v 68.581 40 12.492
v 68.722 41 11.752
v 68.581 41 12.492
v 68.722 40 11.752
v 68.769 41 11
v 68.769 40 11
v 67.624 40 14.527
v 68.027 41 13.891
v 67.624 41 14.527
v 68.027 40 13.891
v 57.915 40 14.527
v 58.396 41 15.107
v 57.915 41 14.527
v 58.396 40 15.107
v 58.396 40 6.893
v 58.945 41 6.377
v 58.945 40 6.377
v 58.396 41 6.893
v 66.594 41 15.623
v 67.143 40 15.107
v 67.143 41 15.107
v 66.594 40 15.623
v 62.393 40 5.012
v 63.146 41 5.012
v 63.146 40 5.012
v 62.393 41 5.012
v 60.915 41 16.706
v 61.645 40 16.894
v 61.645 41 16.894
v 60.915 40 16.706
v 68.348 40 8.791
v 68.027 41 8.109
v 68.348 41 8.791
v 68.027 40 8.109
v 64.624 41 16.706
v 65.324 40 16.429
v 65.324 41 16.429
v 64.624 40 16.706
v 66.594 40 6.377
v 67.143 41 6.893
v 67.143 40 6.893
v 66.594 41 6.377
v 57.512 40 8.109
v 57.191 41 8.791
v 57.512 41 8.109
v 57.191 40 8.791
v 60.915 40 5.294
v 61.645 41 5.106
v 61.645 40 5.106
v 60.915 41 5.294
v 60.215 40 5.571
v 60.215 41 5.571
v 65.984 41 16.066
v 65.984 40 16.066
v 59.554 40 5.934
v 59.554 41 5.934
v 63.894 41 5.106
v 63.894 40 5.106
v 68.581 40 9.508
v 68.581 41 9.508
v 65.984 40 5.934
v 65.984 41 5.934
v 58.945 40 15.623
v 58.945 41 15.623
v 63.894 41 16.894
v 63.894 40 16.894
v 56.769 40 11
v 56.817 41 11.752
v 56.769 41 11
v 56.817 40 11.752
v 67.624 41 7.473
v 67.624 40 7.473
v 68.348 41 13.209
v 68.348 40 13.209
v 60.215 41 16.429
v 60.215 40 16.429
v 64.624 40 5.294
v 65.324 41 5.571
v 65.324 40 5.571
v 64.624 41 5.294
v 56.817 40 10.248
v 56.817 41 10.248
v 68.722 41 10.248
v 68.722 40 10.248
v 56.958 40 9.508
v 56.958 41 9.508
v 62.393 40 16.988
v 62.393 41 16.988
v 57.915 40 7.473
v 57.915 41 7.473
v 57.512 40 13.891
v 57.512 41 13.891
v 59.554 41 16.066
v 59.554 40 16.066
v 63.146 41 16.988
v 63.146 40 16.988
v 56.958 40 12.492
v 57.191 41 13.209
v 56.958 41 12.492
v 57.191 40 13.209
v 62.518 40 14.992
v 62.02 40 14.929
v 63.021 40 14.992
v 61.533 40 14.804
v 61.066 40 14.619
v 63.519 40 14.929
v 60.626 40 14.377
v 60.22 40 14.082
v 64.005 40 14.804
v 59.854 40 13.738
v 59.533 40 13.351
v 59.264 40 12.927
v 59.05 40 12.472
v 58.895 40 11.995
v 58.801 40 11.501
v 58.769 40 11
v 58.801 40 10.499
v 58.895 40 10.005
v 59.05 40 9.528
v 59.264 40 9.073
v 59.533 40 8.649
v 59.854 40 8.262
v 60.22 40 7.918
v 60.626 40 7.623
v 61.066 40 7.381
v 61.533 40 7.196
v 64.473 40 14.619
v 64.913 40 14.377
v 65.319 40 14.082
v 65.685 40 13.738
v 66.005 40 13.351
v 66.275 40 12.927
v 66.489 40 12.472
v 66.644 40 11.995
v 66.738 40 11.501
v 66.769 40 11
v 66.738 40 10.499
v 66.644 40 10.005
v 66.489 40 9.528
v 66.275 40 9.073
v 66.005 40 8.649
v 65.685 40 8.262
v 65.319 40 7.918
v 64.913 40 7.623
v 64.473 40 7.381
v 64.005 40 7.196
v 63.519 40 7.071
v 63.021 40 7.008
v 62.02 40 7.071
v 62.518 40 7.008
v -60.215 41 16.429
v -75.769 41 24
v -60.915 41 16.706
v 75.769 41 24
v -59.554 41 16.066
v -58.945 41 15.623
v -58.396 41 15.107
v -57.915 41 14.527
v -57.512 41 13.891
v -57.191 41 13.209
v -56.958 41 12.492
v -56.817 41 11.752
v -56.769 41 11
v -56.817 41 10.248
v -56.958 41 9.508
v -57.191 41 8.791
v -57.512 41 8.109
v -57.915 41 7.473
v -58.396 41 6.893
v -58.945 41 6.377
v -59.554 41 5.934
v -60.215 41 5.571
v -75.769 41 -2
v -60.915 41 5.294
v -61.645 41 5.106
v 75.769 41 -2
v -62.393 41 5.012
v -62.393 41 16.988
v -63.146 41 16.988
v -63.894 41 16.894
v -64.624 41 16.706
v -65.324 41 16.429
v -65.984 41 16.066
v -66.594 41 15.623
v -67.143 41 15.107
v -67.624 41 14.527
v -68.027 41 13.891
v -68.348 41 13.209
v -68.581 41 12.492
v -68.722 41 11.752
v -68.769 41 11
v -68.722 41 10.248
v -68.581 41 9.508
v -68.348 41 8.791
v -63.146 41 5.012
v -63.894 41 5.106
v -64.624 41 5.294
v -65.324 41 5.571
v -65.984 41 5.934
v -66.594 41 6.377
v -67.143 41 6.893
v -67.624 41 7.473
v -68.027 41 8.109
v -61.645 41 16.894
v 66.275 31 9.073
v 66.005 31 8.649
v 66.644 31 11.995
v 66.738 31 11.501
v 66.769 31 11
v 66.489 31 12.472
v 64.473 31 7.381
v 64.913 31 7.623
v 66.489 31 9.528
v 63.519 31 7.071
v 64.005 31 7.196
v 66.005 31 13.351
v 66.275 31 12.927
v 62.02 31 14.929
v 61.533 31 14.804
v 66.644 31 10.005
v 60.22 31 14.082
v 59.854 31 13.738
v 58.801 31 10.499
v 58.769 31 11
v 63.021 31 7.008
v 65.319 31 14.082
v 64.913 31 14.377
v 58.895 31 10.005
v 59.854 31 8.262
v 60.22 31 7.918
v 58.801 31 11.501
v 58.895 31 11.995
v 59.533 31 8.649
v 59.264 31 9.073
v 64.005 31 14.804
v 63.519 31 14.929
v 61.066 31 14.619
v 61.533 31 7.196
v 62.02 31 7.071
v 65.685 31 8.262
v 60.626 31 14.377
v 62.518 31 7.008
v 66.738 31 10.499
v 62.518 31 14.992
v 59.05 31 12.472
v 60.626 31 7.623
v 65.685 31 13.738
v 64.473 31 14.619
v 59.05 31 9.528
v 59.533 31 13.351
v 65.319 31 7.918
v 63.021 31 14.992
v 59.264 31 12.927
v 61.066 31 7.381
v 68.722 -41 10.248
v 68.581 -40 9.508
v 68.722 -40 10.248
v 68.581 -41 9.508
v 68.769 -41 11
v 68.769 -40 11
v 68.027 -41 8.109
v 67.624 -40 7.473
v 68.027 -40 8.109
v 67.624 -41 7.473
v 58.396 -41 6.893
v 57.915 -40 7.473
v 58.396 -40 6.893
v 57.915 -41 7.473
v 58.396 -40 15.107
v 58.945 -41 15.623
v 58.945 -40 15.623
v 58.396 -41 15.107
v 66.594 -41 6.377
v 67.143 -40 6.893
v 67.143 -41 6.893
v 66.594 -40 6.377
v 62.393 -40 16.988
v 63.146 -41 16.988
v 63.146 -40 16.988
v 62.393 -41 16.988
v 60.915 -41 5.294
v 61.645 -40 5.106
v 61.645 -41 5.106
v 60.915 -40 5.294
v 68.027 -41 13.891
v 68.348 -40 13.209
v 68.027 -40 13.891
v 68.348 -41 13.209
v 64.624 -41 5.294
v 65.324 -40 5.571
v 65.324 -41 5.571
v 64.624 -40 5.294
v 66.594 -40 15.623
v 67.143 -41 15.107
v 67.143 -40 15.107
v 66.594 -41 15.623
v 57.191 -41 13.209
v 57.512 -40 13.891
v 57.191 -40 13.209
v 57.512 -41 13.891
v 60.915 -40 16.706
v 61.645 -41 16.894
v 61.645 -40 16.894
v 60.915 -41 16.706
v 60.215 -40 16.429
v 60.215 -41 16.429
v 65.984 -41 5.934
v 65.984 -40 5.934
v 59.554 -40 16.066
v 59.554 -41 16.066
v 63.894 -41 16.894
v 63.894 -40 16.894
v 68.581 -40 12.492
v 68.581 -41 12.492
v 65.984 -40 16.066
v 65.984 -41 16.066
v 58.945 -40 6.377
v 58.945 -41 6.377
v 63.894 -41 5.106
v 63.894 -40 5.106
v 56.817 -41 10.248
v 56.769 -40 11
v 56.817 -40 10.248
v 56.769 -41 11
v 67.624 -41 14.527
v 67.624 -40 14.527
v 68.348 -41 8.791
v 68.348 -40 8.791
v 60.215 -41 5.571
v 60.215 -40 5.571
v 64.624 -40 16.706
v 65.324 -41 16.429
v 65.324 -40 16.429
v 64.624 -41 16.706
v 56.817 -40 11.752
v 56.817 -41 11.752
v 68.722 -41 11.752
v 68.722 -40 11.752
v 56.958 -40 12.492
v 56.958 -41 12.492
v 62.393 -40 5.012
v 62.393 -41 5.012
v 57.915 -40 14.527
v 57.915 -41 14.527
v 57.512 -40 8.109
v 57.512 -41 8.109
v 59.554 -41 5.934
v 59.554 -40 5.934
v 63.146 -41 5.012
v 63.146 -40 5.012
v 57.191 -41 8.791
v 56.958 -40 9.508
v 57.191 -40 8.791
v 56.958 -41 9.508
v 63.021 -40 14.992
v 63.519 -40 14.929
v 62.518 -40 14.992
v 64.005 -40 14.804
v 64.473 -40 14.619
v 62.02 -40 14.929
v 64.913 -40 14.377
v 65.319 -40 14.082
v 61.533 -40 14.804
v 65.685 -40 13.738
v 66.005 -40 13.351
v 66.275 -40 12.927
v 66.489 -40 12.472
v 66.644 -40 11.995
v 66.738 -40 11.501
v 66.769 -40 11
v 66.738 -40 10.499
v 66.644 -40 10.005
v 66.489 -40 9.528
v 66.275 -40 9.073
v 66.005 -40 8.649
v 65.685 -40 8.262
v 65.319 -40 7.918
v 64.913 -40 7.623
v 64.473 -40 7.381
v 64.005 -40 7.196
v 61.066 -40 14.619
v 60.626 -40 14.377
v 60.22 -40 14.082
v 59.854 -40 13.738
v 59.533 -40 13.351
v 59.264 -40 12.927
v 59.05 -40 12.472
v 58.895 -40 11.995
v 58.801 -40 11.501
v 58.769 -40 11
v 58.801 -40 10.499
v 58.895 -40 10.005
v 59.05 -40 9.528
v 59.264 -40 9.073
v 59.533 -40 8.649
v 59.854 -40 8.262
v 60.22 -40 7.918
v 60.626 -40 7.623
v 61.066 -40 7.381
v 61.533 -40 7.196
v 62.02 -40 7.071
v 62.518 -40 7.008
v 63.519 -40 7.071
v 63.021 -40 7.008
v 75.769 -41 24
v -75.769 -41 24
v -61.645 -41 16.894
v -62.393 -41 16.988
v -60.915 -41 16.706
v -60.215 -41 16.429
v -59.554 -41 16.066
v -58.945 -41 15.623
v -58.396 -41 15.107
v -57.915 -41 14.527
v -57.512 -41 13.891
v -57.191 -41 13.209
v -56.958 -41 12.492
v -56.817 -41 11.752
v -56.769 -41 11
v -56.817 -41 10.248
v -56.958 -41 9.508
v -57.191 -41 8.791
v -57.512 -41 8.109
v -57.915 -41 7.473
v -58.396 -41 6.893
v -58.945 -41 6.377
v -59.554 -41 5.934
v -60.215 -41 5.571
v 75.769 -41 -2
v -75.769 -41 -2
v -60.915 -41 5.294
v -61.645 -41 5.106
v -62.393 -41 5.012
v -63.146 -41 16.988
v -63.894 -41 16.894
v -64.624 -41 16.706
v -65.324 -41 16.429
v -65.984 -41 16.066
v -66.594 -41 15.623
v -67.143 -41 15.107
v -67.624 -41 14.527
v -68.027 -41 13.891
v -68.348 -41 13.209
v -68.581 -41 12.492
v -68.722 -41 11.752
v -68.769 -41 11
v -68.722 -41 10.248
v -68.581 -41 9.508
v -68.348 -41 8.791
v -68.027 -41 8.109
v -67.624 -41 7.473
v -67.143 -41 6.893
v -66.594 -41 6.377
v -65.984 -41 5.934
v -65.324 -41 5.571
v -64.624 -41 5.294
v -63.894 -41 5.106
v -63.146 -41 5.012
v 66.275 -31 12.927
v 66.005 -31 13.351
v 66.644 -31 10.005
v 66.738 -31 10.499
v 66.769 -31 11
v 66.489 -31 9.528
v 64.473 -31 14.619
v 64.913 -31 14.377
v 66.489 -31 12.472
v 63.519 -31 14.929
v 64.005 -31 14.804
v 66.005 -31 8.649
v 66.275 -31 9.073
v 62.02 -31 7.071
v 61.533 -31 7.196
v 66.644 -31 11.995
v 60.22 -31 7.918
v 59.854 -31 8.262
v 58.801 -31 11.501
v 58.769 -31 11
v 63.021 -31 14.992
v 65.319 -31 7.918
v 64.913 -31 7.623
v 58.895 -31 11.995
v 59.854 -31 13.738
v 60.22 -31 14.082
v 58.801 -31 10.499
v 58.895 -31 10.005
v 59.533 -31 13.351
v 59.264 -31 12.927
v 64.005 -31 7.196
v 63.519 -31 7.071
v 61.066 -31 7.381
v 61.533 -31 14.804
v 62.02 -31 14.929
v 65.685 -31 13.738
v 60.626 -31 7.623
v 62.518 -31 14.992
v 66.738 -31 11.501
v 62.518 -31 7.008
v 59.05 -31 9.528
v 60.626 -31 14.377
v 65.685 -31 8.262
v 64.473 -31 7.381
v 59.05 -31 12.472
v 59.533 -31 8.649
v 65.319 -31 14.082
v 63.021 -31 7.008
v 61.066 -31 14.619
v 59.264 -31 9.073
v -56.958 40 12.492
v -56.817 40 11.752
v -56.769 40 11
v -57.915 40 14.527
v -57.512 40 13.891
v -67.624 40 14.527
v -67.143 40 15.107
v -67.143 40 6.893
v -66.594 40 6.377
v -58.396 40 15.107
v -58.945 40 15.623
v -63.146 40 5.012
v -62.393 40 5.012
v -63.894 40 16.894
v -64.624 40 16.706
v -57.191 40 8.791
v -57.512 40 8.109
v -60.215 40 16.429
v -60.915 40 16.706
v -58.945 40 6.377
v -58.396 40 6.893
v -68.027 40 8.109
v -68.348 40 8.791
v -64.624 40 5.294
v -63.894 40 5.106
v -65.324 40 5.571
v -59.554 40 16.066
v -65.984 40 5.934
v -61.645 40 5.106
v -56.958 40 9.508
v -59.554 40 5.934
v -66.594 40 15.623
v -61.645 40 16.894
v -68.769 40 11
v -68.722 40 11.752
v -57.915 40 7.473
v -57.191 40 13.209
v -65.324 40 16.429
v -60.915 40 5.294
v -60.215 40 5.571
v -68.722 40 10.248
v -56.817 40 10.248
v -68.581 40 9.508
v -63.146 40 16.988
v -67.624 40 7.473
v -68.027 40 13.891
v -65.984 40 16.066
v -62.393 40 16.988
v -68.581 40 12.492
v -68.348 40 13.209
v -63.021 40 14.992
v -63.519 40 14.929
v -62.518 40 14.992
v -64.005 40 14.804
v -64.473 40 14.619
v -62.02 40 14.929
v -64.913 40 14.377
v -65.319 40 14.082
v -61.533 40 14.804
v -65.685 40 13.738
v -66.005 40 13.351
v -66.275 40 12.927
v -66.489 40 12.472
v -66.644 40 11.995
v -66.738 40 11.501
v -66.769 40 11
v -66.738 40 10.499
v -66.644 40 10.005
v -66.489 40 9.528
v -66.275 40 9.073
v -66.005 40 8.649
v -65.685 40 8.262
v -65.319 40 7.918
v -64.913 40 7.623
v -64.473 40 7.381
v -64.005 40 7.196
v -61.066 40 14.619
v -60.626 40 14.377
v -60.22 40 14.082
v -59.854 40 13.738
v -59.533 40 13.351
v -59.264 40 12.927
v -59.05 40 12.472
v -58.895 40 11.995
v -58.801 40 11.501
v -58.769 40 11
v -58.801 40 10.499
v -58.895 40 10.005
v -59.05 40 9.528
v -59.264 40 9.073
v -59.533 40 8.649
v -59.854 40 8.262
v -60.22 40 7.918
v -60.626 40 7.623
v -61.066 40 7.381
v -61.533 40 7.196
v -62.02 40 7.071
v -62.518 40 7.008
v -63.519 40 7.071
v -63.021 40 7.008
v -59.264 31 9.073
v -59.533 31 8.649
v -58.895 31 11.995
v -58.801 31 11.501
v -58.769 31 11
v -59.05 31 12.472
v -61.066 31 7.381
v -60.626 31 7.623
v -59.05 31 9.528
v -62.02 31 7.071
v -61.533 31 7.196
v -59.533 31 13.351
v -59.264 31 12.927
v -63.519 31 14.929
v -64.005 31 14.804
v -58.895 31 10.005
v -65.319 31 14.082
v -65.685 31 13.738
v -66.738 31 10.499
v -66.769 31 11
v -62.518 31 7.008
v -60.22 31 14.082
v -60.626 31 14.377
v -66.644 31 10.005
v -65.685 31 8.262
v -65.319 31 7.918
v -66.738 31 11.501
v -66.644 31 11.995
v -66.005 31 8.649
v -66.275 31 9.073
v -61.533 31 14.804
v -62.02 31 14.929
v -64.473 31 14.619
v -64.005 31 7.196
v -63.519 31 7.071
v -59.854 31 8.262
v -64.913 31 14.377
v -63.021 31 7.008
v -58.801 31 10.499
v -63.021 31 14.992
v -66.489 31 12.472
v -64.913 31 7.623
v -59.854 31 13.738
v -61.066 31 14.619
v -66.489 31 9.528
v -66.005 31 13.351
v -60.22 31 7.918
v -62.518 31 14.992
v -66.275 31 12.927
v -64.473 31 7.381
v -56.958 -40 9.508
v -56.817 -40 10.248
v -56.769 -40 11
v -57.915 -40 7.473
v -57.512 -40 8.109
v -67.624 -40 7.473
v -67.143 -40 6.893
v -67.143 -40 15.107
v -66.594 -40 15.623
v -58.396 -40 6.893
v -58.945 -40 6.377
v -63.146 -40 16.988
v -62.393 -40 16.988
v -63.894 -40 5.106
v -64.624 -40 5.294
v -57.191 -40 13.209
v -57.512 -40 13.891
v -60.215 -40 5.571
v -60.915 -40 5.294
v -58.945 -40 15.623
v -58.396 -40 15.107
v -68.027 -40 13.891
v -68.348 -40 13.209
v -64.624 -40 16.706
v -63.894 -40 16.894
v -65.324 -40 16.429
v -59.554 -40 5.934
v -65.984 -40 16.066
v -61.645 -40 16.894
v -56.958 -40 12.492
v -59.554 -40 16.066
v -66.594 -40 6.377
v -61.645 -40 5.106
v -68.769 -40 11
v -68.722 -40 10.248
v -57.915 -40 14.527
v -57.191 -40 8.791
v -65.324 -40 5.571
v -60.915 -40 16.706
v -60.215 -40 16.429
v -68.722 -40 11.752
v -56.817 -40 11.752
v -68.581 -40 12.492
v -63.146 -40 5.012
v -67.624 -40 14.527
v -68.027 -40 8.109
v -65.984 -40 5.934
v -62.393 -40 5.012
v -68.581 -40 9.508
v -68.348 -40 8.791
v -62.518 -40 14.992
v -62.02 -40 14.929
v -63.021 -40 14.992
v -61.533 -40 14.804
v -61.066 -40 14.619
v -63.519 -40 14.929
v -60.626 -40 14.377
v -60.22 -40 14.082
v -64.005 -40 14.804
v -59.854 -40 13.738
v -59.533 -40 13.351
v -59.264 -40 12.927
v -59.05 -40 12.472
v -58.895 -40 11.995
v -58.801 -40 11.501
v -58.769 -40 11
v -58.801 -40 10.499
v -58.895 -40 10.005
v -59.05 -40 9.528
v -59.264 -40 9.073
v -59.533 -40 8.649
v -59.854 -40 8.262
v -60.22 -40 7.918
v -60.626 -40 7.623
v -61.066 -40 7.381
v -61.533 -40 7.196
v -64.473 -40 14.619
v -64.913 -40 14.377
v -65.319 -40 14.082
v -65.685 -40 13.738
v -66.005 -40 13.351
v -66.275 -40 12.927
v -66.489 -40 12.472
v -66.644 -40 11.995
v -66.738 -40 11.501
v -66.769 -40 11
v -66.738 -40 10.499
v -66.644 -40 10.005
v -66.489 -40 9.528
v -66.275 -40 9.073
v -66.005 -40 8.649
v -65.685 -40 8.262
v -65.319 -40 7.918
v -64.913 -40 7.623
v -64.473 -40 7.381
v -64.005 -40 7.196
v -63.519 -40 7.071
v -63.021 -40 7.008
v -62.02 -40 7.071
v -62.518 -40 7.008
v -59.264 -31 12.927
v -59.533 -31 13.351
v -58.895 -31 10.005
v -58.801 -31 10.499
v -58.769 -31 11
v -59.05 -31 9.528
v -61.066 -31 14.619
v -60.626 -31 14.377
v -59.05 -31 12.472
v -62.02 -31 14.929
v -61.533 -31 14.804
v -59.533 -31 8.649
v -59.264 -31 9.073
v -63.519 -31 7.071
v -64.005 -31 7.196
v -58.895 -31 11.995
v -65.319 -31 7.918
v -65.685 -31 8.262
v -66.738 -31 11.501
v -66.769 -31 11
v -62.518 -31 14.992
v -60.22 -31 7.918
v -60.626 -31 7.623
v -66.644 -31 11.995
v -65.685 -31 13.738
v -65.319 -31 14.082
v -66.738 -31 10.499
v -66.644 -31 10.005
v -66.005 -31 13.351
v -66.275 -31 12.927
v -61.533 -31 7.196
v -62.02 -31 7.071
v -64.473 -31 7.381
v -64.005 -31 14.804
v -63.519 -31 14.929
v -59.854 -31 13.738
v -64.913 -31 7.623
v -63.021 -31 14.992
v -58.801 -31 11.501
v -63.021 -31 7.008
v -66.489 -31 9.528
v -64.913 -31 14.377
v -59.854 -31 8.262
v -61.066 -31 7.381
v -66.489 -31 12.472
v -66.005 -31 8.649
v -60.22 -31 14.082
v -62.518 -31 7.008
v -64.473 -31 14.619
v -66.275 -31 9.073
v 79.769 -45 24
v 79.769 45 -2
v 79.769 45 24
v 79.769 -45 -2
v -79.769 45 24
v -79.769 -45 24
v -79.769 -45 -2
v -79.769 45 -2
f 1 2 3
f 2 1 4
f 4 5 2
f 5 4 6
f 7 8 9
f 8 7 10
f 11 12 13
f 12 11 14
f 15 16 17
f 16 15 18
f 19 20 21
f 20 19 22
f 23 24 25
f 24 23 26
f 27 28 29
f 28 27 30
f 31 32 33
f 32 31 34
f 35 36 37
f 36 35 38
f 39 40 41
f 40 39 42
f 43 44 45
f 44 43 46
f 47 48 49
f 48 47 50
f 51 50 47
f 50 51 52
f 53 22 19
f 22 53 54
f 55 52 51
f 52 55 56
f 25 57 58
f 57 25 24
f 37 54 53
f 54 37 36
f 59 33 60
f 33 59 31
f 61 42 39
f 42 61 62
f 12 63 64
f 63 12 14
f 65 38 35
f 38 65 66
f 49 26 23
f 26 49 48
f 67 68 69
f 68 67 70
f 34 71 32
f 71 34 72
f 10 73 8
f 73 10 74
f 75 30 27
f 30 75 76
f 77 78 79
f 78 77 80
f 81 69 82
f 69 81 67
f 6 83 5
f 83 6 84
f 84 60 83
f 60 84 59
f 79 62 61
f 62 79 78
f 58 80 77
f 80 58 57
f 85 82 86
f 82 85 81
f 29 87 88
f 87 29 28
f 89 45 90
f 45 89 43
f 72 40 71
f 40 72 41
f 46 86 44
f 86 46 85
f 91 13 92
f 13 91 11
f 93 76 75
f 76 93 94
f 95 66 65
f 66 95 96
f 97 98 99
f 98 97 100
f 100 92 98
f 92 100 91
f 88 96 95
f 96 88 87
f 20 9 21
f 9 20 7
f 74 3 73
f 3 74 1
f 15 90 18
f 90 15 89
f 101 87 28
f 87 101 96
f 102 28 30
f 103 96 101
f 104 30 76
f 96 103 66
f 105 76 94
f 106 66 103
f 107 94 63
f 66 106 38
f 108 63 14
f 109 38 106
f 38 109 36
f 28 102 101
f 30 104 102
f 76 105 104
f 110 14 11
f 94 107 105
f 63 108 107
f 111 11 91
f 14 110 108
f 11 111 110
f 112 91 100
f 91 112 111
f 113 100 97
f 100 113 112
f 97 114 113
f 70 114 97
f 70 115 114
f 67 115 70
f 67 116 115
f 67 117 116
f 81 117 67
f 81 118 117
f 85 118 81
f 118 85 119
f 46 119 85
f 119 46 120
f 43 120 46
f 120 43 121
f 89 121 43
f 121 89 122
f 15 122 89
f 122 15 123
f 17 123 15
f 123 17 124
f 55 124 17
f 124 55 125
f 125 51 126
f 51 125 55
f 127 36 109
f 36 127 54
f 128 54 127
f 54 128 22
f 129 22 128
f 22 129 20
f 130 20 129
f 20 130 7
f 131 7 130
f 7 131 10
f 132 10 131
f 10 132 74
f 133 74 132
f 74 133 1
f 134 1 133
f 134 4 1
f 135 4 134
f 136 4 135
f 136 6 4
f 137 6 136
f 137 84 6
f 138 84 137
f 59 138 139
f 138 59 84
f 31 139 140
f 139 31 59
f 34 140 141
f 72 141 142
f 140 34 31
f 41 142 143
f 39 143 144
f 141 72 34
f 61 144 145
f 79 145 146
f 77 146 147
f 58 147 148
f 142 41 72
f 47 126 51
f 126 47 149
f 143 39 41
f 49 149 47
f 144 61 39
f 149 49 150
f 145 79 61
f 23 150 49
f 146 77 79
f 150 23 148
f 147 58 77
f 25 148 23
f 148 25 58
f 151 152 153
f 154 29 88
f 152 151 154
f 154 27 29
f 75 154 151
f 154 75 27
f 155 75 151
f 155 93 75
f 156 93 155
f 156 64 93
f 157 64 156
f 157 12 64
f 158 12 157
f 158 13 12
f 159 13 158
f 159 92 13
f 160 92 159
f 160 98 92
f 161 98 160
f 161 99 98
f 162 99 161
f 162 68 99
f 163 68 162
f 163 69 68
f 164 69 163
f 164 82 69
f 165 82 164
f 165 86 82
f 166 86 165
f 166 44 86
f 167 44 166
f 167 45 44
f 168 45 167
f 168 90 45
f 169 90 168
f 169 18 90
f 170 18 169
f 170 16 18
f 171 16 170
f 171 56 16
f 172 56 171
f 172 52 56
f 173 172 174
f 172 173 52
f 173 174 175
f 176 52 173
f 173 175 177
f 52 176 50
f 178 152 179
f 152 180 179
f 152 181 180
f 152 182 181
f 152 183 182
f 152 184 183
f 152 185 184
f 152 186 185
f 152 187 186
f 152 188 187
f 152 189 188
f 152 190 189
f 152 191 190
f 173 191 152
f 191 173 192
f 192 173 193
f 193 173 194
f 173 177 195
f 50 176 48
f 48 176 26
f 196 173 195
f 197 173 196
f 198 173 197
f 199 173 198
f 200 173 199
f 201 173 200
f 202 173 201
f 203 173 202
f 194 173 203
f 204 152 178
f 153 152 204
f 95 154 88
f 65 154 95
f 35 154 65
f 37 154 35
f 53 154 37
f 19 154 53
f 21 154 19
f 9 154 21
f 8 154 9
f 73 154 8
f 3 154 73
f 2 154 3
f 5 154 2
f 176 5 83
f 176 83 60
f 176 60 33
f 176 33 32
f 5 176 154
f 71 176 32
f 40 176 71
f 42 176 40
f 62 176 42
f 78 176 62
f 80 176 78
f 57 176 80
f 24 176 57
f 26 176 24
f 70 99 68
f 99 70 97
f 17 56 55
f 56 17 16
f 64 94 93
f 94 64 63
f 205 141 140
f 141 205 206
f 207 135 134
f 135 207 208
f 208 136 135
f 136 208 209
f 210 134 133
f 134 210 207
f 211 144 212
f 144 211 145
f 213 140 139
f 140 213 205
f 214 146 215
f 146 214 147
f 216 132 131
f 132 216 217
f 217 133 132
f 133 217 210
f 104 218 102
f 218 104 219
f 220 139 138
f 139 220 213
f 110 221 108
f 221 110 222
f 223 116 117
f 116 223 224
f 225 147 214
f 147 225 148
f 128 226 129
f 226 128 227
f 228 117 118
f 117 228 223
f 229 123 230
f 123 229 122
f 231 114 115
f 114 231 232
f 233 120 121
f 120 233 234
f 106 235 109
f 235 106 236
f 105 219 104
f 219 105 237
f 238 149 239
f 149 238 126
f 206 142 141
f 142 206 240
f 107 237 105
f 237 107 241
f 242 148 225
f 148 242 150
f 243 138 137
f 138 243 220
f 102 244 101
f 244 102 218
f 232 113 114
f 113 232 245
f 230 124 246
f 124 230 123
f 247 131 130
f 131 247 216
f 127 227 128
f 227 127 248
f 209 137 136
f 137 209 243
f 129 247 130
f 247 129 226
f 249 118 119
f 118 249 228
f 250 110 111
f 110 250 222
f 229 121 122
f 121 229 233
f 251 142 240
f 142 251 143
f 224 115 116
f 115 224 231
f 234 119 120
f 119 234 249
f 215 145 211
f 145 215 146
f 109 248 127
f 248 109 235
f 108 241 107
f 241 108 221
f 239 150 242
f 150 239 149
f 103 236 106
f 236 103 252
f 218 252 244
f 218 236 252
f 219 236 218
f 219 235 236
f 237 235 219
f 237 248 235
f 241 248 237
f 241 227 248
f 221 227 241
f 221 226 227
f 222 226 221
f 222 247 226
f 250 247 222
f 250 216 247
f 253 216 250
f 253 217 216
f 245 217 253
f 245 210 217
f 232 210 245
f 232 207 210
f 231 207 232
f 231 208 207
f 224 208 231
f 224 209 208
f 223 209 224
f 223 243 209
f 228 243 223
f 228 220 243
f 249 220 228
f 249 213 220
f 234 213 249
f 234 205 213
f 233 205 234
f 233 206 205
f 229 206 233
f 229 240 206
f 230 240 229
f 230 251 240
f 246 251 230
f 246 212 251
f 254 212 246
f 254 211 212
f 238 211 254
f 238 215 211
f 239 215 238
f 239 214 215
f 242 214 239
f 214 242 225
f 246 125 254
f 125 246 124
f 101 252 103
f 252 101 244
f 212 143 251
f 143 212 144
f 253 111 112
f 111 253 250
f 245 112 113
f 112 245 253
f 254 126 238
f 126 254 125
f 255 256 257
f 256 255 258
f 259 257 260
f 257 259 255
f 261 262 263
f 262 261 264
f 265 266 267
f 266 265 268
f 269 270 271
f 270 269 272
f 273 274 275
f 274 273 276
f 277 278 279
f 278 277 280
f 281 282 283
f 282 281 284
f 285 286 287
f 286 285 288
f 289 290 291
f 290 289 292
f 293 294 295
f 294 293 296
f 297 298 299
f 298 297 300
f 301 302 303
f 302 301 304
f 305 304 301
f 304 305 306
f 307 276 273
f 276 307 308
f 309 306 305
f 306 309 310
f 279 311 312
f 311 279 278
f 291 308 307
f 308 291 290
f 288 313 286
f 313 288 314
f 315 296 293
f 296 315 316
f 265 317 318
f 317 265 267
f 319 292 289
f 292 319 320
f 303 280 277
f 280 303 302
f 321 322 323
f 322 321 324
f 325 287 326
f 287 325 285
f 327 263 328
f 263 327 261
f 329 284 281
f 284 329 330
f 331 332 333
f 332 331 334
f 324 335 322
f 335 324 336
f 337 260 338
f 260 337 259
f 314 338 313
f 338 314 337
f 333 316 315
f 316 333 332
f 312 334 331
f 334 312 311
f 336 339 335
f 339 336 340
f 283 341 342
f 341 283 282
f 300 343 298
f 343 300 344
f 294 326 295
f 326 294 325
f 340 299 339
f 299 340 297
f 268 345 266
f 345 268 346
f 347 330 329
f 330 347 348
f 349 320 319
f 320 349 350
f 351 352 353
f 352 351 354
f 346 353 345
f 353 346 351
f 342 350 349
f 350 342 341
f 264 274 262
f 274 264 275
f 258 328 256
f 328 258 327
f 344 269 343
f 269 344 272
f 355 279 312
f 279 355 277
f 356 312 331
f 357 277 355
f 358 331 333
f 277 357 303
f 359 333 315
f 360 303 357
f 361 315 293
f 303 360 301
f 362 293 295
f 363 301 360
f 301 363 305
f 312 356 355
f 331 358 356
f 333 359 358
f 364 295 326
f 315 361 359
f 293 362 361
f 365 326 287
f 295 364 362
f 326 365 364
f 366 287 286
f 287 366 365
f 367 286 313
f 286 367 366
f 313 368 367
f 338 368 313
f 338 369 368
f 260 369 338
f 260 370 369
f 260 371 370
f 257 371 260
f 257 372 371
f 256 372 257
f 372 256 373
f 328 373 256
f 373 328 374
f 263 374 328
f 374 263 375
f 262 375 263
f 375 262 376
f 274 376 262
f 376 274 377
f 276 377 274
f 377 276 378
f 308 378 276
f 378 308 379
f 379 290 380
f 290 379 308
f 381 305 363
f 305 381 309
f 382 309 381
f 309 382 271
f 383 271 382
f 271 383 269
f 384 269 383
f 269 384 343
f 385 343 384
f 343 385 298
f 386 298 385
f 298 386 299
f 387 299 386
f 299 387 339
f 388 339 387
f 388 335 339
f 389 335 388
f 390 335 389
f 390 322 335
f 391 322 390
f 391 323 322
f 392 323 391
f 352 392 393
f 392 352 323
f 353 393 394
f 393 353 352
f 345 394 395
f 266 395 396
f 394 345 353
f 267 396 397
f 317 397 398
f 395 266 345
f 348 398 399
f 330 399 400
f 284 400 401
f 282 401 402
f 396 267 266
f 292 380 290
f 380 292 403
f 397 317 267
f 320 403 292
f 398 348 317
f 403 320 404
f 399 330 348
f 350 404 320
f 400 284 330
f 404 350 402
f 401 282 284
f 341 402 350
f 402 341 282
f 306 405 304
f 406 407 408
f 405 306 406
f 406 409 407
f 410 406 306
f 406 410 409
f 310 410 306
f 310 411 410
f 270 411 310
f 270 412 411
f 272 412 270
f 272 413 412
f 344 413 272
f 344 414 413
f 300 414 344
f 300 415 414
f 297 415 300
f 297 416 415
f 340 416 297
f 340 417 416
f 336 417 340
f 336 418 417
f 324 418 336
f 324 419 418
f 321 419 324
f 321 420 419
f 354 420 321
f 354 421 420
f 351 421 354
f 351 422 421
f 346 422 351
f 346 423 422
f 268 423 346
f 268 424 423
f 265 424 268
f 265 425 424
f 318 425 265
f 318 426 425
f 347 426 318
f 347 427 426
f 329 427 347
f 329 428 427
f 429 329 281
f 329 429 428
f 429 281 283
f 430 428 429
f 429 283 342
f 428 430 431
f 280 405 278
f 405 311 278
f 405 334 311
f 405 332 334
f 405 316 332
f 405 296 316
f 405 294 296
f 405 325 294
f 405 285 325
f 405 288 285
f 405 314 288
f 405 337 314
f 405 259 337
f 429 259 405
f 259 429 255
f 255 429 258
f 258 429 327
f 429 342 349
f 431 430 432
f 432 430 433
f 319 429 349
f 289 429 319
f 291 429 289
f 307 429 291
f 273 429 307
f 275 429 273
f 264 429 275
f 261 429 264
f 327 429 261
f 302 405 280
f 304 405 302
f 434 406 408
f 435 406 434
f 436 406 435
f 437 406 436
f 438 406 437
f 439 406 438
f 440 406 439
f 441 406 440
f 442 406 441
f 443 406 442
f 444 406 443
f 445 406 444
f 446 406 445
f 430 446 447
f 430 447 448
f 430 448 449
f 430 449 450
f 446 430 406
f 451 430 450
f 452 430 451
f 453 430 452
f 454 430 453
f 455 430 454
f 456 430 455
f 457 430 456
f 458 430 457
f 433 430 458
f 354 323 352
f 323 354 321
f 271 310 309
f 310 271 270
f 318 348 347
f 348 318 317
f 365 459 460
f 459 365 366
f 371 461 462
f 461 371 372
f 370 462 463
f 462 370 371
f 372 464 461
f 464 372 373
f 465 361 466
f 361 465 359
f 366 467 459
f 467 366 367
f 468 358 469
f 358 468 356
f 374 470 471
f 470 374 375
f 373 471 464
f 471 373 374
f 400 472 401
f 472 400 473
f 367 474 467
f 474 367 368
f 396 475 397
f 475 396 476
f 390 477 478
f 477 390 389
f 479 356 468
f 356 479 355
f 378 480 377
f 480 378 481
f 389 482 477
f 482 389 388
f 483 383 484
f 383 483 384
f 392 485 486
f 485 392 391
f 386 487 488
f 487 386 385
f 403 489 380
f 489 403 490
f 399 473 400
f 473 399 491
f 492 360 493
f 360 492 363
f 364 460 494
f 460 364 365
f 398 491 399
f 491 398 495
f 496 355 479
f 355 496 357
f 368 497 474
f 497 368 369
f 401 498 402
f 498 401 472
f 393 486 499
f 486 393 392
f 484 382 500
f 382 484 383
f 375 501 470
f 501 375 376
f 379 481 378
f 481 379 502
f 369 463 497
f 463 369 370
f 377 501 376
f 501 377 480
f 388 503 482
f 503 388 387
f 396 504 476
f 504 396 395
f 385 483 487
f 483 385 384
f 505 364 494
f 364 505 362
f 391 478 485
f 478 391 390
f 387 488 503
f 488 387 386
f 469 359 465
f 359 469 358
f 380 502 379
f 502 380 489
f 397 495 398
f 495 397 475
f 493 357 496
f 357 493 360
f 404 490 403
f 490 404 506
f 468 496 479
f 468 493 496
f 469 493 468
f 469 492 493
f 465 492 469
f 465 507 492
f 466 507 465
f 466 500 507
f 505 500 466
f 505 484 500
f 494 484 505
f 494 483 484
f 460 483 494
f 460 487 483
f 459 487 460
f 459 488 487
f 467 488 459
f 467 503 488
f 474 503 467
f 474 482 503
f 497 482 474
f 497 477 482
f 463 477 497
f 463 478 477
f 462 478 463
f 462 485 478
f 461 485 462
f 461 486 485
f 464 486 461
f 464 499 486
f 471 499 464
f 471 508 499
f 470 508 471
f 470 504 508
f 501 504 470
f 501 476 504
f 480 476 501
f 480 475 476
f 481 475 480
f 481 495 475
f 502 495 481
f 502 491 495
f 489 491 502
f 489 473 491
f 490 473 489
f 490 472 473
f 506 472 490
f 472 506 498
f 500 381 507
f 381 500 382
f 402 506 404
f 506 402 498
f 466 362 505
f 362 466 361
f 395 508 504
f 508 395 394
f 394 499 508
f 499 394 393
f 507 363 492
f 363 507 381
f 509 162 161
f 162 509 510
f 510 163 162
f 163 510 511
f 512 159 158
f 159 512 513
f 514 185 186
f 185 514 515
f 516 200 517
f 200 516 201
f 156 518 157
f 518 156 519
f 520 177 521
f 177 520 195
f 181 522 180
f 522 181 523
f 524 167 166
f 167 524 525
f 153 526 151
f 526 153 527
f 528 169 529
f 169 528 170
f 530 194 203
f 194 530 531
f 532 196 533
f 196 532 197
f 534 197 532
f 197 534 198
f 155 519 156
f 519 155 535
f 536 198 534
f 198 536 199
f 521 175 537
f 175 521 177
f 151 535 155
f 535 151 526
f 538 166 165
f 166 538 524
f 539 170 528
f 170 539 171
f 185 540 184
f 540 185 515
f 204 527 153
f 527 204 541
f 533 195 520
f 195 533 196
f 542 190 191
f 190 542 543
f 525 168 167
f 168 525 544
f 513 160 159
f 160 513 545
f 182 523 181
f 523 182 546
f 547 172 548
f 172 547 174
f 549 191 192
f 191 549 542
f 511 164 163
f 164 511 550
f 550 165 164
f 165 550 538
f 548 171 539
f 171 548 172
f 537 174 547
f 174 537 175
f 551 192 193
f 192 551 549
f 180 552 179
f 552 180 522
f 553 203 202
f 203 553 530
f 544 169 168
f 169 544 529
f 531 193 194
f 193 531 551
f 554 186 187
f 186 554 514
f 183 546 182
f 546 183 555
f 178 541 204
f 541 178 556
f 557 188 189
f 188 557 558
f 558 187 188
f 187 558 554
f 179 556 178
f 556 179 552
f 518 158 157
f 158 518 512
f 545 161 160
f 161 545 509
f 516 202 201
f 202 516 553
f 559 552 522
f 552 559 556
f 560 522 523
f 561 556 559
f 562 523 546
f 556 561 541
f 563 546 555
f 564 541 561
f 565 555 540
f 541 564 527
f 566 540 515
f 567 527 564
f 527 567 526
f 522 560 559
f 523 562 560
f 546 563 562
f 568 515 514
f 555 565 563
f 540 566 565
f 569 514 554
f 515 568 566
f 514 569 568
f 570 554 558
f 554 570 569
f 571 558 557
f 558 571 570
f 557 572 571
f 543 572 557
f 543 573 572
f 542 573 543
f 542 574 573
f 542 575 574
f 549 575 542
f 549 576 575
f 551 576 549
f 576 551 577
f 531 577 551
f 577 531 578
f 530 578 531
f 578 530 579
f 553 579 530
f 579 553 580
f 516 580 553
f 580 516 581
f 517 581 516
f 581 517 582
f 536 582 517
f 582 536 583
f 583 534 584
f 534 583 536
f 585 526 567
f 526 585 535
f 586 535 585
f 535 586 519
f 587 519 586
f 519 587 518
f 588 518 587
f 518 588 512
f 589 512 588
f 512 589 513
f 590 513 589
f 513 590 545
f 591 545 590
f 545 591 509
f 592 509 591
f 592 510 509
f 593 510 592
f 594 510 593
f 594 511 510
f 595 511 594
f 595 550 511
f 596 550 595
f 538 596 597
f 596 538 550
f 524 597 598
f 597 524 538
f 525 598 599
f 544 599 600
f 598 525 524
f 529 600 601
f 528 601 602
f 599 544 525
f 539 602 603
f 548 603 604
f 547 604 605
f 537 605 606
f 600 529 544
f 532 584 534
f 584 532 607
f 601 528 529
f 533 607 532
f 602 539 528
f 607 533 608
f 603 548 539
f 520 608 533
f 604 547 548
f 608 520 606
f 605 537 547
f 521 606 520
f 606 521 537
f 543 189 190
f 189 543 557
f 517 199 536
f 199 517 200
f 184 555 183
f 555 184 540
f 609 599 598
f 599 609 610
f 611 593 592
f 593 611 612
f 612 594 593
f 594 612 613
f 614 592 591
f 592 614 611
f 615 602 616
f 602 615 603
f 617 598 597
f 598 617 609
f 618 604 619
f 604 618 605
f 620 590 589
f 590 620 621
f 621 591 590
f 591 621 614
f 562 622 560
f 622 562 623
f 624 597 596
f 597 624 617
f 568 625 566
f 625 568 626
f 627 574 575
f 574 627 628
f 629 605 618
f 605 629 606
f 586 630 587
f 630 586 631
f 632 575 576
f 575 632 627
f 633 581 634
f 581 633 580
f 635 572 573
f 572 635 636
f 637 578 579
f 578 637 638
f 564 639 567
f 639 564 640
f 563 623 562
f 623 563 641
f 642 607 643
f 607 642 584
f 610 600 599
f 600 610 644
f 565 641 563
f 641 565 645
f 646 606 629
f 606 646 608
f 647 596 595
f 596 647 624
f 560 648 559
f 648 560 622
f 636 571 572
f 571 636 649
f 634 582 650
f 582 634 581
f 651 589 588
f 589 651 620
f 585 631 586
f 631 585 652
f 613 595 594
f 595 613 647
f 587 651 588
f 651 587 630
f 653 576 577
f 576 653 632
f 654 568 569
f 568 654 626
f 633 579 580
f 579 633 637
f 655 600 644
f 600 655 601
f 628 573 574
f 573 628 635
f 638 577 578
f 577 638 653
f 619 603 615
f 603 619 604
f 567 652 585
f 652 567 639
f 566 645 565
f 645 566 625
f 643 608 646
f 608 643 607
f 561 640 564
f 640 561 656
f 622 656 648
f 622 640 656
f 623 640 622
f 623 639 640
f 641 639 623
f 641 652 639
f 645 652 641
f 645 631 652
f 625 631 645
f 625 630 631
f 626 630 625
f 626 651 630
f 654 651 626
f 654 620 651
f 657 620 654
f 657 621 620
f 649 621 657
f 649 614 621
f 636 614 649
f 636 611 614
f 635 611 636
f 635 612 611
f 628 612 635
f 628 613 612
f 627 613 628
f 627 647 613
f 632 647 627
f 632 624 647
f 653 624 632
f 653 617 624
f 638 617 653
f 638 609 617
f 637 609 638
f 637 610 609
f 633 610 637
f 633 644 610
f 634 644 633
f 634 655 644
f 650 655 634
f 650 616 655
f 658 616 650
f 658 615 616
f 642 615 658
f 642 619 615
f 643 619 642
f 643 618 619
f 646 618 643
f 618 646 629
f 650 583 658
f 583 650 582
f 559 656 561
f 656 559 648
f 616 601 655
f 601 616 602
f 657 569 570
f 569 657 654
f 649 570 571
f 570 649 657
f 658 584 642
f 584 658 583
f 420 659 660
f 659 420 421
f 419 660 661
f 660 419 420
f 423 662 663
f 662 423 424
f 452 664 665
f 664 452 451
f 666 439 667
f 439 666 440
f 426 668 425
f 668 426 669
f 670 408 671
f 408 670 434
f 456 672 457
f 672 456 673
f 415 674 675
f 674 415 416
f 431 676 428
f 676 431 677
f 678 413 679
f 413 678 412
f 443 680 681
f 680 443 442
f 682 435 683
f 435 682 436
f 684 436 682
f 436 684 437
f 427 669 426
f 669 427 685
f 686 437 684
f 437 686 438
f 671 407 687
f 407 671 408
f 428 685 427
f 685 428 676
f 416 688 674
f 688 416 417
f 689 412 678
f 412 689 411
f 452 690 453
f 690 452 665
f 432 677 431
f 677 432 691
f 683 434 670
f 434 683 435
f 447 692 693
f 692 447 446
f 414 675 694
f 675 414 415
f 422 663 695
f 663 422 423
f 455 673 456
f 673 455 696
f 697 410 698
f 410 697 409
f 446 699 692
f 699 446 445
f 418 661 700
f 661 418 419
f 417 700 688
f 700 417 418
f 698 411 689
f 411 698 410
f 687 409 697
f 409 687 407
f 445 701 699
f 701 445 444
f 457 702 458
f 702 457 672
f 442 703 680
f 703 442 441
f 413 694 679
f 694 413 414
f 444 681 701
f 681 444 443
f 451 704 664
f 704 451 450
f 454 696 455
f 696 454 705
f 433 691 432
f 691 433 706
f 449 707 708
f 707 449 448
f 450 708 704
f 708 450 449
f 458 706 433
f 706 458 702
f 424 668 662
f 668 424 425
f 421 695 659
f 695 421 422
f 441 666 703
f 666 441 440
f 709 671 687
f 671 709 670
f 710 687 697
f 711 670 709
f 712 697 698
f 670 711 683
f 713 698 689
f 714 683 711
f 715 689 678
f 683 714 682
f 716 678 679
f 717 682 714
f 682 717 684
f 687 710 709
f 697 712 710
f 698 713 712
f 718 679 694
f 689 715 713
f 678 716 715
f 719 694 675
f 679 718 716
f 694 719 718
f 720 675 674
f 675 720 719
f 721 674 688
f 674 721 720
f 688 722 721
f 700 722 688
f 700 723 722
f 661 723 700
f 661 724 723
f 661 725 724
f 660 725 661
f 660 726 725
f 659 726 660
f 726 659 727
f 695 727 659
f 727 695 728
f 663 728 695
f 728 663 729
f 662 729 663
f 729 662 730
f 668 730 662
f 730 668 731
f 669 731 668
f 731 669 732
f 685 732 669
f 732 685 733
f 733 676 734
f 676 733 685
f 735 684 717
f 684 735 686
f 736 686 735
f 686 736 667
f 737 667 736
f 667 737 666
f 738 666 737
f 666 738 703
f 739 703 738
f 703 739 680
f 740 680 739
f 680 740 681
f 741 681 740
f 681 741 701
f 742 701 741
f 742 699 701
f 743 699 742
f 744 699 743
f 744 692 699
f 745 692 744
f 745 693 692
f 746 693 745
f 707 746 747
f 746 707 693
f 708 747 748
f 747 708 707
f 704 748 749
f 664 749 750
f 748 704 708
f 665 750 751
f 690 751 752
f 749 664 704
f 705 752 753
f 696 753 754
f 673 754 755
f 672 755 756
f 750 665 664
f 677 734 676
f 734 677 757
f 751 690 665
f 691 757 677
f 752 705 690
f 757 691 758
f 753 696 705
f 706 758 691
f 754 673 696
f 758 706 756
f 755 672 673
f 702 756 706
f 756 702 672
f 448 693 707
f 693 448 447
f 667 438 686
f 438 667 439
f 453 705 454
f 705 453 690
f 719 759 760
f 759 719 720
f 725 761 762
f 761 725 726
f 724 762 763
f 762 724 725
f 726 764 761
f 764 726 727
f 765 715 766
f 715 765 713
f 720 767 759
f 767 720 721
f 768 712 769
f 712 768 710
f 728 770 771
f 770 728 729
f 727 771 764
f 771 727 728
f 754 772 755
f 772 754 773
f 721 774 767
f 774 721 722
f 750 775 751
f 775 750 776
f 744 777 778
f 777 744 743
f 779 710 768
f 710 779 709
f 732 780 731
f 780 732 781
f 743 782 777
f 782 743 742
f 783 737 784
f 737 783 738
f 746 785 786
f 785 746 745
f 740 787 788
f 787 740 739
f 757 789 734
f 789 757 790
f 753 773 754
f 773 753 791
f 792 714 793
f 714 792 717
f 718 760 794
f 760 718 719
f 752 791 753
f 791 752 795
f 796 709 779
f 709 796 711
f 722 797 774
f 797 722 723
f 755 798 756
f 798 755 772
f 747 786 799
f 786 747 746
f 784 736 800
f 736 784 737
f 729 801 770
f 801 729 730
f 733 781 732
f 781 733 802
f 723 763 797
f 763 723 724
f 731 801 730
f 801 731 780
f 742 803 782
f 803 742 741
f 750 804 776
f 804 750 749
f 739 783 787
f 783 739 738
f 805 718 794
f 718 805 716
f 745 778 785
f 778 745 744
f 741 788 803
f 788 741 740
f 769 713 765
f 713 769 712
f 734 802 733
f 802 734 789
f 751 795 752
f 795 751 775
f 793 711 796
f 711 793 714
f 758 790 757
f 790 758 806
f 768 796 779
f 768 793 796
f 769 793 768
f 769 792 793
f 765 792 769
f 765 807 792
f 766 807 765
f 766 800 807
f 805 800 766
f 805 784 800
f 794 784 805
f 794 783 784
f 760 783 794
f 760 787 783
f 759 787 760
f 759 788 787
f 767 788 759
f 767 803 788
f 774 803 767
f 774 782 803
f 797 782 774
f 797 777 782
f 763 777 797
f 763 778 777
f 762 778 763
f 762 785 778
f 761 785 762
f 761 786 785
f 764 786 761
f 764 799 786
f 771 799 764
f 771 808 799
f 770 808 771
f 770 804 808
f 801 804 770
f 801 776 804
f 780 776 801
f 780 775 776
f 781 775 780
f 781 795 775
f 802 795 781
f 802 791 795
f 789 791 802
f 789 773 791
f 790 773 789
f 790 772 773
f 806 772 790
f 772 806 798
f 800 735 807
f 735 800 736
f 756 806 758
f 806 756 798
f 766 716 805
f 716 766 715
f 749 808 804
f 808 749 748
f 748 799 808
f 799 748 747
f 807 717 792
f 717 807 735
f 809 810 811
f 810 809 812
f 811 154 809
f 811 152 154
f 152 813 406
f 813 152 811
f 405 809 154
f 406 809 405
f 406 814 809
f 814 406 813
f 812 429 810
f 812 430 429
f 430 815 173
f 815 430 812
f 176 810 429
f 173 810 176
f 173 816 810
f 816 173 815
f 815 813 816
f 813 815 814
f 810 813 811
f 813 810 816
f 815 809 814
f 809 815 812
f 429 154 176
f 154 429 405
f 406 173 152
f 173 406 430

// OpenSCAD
//Hello World!
$fn=50.0;
bodyThickness=4.0;
bearingDiameter=22.0;
bearingWidth=7.0;
bearingInnerDiameter=8.0;
bearingClearance=2.0;
spoolDiameter=195.0;
spoolWidth=80.0;
spoolClearance=2.0;
union(){
  translate([sqrt((pow(((spoolDiameter/2.0)+(bearingDiameter/2.0)),2.0)-pow((((spoolDiameter/2.0)+spoolClearance)-(bearingDiameter/2.0)),2.0))),((spoolWidth/2.0)+1.0),(bearingDiameter/2.0)]){
    rotate([90.0, 0.0, 0.0]){
      union(){
        cylinder(1.0, ((bearingInnerDiameter/2.0)+2.0), ((bearingInnerDiameter/2.0)+2.0));
        cylinder(((1.0+bearingWidth)+2.0), (bearingInnerDiameter/2.0), (bearingInnerDiameter/2.0));
      }
    }
  }
  translate([sqrt((pow(((spoolDiameter/2.0)+(bearingDiameter/2.0)),2.0)-pow((((spoolDiameter/2.0)+spoolClearance)-(bearingDiameter/2.0)),2.0))),(((-spoolWidth)/2.0)-1.0),(bearingDiameter/2.0)]){
    rotate([-90.0, 0.0, 0.0]){
      union(){
        cylinder(1.0, ((bearingInnerDiameter/2.0)+2.0), ((bearingInnerDiameter/2.0)+2.0));
        cylinder(((1.0+bearingWidth)+2.0), (bearingInnerDiameter/2.0), (bearingInnerDiameter/2.0));
      }
    }
  }
  translate([(-sqrt((pow(((spoolDiameter/2.0)+(bearingDiameter/2.0)),2.0)-pow((((spoolDiameter/2.0)+spoolClearance)-(bearingDiameter/2.0)),2.0)))),((spoolWidth/2.0)+1.0),(bearingDiameter/2.0)]){
    rotate([90.0, 0.0, 0.0]){
      union(){
        cylinder(1.0, ((bearingInnerDiameter/2.0)+2.0), ((bearingInnerDiameter/2.0)+2.0));
        cylinder(((1.0+bearingWidth)+2.0), (bearingInnerDiameter/2.0), (bearingInnerDiameter/2.0));
      }
    }
  }
  translate([(-sqrt((pow(((spoolDiameter/2.0)+(bearingDiameter/2.0)),2.0)-pow((((spoolDiameter/2.0)+spoolClearance)-(bearingDiameter/2.0)),2.0)))),(((-spoolWidth)/2.0)-1.0),(bearingDiameter/2.0)]){
    rotate([-90.0, 0.0, 0.0]){
      union(){
        cylinder(1.0, ((bearingInnerDiameter/2.0)+2.0), ((bearingInnerDiameter/2.0)+2.0));
        cylinder(((1.0+bearingWidth)+2.0), (bearingInnerDiameter/2.0), (bearingInnerDiameter/2.0));
      }
    }
  }
  difference(){
    translate([((((-sqrt((pow(((spoolDiameter/2.0)+(bearingDiameter/2.0)),2.0)-pow((((spoolDiameter/2.0)+spoolClearance)-(bearingDiameter/2.0)),2.0))))-bearingClearance)-(bearingDiameter/2.0))-bodyThickness),((((-spoolWidth)/2.0)-1.0)-bodyThickness),(-bearingClearance)]){
      cube([((((2.0*sqrt((pow(((spoolDiameter/2.0)+(bearingDiameter/2.0)),2.0)-pow((((spoolDiameter/2.0)+spoolClearance)-(bearingDiameter/2.0)),2.0))))+(2.0*bearingClearance))+bearingDiameter)+(2.0*bodyThickness)), ((spoolWidth+2.0)+(2.0*bodyThickness)), (bearingDiameter+(2.0*bearingClearance))]);
    }
    translate([(((-sqrt((pow(((spoolDiameter/2.0)+(bearingDiameter/2.0)),2.0)-pow((((spoolDiameter/2.0)+spoolClearance)-(bearingDiameter/2.0)),2.0))))-bearingClearance)-(bearingDiameter/2.0)),(((-spoolWidth)/2.0)-1.0),((-bearingClearance)-0.5)]){
      cube([(((2.0*sqrt((pow(((spoolDiameter/2.0)+(bearingDiameter/2.0)),2.0)-pow((((spoolDiameter/2.0)+spoolClearance)-(bearingDiameter/2.0)),2.0))))+(2.0*bearingClearance))+bearingDiameter), (spoolWidth+2.0), ((bearingDiameter+(2.0*bearingClearance))+1.0)]);
    }
  }
}
//Goodbye World!
